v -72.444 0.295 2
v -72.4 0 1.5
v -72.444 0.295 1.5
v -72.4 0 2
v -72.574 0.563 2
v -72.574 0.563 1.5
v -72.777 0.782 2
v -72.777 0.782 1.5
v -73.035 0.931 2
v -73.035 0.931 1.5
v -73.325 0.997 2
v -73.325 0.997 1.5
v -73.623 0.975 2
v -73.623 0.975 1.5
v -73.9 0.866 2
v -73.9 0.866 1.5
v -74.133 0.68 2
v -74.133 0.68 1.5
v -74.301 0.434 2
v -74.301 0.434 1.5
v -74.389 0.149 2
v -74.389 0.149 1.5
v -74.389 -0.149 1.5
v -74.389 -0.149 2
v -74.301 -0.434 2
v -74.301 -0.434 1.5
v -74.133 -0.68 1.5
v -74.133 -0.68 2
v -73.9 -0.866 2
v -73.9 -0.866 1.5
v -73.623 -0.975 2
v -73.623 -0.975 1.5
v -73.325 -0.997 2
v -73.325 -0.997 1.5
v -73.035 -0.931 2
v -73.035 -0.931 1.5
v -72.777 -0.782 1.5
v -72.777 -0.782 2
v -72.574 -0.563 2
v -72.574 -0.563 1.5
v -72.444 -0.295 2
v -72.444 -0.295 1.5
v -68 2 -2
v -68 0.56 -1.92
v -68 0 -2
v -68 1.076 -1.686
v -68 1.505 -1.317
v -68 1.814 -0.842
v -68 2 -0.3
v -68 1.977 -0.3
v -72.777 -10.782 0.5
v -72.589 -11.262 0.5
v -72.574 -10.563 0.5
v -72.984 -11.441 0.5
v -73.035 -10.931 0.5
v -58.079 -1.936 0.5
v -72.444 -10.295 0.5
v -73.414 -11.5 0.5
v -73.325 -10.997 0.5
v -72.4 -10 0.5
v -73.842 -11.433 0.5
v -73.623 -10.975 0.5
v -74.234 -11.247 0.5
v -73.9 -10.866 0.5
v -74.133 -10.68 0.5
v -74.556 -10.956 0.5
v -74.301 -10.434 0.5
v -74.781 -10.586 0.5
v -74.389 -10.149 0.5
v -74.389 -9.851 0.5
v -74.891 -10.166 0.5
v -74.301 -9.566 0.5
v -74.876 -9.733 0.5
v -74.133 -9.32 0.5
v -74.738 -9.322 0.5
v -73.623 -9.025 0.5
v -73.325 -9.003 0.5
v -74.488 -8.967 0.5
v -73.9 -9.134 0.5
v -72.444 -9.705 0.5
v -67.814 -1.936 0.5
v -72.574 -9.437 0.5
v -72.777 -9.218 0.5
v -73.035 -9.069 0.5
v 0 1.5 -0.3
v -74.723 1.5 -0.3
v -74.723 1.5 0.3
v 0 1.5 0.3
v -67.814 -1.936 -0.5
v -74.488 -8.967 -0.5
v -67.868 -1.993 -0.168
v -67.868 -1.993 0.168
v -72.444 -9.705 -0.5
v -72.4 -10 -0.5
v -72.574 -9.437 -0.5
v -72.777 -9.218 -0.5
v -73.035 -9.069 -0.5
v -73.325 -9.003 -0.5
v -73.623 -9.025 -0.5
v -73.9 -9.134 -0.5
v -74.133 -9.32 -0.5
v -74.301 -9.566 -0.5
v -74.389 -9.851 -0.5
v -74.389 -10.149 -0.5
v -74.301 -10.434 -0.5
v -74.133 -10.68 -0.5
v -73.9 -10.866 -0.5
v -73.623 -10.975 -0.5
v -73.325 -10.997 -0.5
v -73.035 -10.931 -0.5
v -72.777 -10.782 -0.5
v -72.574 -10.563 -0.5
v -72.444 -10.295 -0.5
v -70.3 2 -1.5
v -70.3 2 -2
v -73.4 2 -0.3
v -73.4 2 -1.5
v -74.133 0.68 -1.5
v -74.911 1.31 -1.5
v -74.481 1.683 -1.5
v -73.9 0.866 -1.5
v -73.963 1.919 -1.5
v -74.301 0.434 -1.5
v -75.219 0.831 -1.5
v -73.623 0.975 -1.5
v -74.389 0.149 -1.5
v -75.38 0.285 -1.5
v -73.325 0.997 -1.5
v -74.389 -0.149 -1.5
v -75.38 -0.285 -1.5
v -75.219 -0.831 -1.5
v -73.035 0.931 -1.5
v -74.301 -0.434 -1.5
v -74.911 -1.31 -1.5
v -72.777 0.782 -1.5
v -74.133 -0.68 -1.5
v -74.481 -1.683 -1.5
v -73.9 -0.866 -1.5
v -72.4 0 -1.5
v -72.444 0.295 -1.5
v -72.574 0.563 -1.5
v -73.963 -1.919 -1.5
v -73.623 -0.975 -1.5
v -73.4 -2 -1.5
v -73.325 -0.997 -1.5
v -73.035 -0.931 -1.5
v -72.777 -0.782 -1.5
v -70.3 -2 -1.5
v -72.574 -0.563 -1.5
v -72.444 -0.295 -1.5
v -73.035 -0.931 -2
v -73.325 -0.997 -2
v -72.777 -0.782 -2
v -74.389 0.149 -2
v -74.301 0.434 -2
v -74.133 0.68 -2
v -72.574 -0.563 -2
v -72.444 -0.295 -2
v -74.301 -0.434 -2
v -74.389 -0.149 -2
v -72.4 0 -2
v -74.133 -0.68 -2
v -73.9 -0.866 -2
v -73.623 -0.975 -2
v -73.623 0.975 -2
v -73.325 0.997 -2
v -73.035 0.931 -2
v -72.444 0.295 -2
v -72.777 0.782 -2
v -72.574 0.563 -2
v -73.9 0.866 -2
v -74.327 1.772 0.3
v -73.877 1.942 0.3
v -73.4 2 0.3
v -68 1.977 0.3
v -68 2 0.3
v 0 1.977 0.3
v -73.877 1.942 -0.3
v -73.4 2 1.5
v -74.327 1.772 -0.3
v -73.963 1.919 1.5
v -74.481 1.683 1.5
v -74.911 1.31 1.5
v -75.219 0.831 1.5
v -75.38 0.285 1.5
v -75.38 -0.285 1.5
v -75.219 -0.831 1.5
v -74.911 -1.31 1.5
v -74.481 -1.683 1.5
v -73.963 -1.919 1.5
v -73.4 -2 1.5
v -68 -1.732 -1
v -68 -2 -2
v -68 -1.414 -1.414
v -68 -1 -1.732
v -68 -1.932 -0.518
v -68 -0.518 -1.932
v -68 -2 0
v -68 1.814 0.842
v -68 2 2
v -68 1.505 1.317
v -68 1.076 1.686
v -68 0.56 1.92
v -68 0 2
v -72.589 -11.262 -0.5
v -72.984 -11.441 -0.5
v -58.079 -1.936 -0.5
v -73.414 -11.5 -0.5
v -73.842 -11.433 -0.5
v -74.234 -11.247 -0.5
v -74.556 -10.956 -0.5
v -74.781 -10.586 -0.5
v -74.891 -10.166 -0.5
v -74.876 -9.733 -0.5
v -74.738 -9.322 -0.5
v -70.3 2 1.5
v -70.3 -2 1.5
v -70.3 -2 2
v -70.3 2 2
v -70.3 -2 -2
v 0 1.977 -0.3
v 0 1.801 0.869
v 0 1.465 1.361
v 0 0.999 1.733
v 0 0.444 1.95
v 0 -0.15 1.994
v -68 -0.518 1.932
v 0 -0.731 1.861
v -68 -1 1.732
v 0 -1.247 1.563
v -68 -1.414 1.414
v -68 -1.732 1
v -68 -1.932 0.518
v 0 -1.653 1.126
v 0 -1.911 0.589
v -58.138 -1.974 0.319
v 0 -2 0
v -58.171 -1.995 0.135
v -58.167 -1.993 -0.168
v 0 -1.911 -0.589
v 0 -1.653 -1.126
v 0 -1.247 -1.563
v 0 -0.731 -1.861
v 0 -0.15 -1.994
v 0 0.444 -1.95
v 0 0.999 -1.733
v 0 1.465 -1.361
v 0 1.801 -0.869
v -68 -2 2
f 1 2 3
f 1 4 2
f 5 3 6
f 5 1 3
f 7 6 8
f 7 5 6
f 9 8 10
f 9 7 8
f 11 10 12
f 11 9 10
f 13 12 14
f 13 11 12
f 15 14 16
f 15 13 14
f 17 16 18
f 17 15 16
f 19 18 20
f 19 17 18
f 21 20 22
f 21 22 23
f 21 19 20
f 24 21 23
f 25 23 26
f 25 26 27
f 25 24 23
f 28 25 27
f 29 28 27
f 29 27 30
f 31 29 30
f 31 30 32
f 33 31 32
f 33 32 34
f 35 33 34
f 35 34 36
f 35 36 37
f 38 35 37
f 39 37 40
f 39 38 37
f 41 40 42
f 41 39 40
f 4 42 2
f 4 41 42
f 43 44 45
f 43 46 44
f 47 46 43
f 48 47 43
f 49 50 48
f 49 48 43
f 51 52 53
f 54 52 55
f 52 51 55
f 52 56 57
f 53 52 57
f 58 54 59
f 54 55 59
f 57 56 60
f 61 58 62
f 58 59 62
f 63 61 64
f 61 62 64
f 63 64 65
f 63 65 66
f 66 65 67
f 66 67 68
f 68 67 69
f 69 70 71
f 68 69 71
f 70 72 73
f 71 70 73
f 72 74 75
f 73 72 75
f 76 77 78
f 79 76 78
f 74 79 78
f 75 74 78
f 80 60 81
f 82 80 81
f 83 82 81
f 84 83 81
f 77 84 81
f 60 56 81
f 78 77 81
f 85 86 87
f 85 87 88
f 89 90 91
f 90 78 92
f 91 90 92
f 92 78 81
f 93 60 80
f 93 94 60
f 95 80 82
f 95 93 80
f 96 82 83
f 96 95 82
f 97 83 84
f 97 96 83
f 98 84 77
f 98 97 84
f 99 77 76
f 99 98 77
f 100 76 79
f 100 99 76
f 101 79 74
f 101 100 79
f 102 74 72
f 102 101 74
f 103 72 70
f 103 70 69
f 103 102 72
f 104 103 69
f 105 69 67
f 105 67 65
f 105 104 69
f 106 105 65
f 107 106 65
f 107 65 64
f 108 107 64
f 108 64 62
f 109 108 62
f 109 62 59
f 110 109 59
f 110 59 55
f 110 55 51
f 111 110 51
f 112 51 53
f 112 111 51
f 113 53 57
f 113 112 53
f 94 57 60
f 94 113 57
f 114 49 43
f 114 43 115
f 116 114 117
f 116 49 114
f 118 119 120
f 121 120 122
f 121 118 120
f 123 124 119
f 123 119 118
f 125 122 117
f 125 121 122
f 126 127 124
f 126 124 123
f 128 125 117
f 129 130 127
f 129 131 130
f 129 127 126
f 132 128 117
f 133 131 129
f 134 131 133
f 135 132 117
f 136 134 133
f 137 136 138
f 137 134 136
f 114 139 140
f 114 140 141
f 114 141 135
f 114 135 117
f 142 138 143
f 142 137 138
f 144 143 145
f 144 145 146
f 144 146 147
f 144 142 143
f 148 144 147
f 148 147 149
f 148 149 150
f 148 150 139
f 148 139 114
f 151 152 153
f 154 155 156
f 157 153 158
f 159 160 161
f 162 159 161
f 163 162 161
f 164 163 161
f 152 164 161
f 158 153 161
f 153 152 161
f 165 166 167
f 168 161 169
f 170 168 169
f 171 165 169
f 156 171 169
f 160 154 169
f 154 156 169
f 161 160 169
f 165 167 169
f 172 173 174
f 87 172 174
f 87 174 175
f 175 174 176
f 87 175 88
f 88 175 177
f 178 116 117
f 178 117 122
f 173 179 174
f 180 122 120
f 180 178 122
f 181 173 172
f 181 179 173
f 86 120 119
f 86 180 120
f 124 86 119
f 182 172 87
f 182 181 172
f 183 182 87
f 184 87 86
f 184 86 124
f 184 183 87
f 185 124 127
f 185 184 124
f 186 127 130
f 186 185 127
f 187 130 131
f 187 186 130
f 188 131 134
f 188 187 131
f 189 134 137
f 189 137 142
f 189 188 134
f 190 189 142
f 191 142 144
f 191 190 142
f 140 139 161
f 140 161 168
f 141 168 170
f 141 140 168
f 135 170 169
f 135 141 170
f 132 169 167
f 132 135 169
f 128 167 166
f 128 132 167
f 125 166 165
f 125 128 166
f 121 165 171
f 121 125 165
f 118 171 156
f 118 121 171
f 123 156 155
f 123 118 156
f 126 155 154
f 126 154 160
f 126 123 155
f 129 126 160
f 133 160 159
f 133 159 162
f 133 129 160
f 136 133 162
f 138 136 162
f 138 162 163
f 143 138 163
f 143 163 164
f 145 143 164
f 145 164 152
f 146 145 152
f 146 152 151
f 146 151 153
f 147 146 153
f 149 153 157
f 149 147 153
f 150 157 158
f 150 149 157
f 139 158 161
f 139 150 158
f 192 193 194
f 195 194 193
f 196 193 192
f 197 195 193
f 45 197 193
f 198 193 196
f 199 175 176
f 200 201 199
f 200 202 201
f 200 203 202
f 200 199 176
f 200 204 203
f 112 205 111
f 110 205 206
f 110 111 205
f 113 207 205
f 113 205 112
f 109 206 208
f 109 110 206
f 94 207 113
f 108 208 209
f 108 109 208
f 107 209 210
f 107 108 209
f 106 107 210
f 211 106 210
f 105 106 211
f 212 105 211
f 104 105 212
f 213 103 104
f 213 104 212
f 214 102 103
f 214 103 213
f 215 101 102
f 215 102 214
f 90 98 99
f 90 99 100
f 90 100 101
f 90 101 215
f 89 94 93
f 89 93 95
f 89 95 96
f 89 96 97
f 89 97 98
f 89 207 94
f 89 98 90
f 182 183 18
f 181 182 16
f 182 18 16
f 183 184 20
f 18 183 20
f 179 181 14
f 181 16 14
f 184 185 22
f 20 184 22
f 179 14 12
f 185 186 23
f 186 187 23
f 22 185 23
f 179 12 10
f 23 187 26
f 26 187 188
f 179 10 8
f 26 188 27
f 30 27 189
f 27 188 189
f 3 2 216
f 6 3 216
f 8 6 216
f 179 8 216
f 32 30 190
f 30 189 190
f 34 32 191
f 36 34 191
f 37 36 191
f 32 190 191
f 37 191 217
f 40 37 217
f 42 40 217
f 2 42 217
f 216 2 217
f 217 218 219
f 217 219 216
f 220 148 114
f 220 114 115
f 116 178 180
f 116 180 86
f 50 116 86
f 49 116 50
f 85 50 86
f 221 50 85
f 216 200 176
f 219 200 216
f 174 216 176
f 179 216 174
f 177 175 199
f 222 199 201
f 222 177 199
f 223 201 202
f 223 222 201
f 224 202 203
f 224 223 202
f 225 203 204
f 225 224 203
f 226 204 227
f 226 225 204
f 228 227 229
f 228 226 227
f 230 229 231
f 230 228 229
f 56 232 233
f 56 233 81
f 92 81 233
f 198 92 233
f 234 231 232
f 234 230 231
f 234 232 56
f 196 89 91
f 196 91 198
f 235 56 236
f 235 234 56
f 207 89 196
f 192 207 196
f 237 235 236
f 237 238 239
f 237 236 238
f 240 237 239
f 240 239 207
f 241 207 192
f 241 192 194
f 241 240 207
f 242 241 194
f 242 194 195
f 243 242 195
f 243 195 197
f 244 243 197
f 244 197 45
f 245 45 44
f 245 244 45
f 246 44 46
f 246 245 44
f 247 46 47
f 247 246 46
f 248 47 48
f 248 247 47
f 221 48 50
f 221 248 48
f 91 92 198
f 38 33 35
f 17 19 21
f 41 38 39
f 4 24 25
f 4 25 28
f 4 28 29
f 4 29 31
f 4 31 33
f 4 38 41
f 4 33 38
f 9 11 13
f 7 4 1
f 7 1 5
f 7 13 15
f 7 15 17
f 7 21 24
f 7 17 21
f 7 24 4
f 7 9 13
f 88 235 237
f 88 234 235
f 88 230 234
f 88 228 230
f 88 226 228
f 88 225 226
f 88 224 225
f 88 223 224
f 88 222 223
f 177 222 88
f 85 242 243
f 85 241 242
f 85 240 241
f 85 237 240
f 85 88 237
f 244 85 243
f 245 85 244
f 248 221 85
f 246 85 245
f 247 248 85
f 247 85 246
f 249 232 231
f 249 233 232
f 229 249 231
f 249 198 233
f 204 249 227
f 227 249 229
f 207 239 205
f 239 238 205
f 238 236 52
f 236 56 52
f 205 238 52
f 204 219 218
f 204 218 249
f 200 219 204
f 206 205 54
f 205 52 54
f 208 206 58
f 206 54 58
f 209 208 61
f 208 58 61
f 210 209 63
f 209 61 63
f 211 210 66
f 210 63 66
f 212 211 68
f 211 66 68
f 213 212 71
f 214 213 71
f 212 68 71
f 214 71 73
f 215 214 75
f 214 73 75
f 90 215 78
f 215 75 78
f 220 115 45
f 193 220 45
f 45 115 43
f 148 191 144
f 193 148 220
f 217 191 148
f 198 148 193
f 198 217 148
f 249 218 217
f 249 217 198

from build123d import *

# Parameters (mm, degrees)
SKETCH_1_R               = 2
EXTRUDE_1_DEPTH          = 68
EXTRUDE_2_DEPTH          = 2
SKETCH_3_W               = 5.1
SKETCH_3_H               = 0.5
CUT_EXTRUDE_1_DEPTH      = 3
CUT_EXTRUDE_1_DEPTH_BACK = 3
SKETCH_4_R               = 1
EXTRUDE_3_DEPTH          = 2
SKETCH_5_W               = 75.4
SKETCH_5_H               = 0.6
CUT_EXTRUDE_2_DEPTH      = 0.5
SKETCH_6_R               = 1
EXTRUDE_4_DEPTH          = 0.5


with BuildPart() as part:
    # 草图1 → 凸台-拉伸1 (new body)
    with BuildSketch(Plane(origin=(0, 0, 0), x_dir=(0, 0, -1), z_dir=(1, 0, 0))):
        Circle(SKETCH_1_R)
    extrude(amount=-EXTRUDE_1_DEPTH)

    # 草图2 → 凸台-拉伸2 (add, symmetric)
    with BuildSketch(Plane.XY):
        with BuildLine():
            Line((-68, 2), (-73.4, 2))
            ThreePointArc((-73.4, 2), (-75.4, 0), (-73.4, -2))
            Line((-73.4, -2), (-68, -2))
            Line((-68, -2), (-68, 2))
        make_face()
    extrude(amount=EXTRUDE_2_DEPTH, both=True)

    # 草图3 → 切除-拉伸1 (cut, two sides)
    with BuildSketch(Plane(origin=(0, 0, 0), x_dir=(1, 0, 0), z_dir=(0, 1, 0))) as cut_extrude_1_sk:
        with Locations((-72.85, 1.75)):
            Rectangle(SKETCH_3_W, SKETCH_3_H)
        with Locations((-72.85, -1.75)):
            Rectangle(SKETCH_3_W, SKETCH_3_H)
    extrude(amount=CUT_EXTRUDE_1_DEPTH, mode=Mode.SUBTRACT)
    extrude(cut_extrude_1_sk.sketch, amount=-CUT_EXTRUDE_1_DEPTH_BACK, mode=Mode.SUBTRACT)

    # 草图4 → 凸台-拉伸3 (add, symmetric)
    with BuildSketch(Plane.XY):
        with Locations((-73.4, 0)):
            Circle(SKETCH_4_R)
    extrude(amount=EXTRUDE_3_DEPTH, both=True)

    # 草图5 → 切除-拉伸2 (cut)
    with BuildSketch(Plane(origin=(0, 2, 0), x_dir=(1, 0, 0), z_dir=(0, 1, 0))):
        with Locations((-37.7, 0)):
            Rectangle(SKETCH_5_W, SKETCH_5_H)
    extrude(amount=-CUT_EXTRUDE_2_DEPTH, mode=Mode.SUBTRACT)

    # 草图6 → 凸台-拉伸4 (add, symmetric)
    with BuildSketch(Plane.XY):
        with BuildLine():
            Line((-67.4, -1.5), (-57.4, -1.5))
            Line((-57.4, -1.5), (-72.589010682, -11.261862245))
            ThreePointArc((-72.589010682, -11.261862245), (-74.555588863, -10.956354736), (-74.487937961, -8.96733791))
            Line((-74.487937961, -8.96733791), (-67.4, -1.5))
        make_face()
        with Locations((-73.4, -10)):
            Circle(SKETCH_6_R, mode=Mode.SUBTRACT)
    extrude(amount=EXTRUDE_4_DEPTH, both=True)


solid = part.part
